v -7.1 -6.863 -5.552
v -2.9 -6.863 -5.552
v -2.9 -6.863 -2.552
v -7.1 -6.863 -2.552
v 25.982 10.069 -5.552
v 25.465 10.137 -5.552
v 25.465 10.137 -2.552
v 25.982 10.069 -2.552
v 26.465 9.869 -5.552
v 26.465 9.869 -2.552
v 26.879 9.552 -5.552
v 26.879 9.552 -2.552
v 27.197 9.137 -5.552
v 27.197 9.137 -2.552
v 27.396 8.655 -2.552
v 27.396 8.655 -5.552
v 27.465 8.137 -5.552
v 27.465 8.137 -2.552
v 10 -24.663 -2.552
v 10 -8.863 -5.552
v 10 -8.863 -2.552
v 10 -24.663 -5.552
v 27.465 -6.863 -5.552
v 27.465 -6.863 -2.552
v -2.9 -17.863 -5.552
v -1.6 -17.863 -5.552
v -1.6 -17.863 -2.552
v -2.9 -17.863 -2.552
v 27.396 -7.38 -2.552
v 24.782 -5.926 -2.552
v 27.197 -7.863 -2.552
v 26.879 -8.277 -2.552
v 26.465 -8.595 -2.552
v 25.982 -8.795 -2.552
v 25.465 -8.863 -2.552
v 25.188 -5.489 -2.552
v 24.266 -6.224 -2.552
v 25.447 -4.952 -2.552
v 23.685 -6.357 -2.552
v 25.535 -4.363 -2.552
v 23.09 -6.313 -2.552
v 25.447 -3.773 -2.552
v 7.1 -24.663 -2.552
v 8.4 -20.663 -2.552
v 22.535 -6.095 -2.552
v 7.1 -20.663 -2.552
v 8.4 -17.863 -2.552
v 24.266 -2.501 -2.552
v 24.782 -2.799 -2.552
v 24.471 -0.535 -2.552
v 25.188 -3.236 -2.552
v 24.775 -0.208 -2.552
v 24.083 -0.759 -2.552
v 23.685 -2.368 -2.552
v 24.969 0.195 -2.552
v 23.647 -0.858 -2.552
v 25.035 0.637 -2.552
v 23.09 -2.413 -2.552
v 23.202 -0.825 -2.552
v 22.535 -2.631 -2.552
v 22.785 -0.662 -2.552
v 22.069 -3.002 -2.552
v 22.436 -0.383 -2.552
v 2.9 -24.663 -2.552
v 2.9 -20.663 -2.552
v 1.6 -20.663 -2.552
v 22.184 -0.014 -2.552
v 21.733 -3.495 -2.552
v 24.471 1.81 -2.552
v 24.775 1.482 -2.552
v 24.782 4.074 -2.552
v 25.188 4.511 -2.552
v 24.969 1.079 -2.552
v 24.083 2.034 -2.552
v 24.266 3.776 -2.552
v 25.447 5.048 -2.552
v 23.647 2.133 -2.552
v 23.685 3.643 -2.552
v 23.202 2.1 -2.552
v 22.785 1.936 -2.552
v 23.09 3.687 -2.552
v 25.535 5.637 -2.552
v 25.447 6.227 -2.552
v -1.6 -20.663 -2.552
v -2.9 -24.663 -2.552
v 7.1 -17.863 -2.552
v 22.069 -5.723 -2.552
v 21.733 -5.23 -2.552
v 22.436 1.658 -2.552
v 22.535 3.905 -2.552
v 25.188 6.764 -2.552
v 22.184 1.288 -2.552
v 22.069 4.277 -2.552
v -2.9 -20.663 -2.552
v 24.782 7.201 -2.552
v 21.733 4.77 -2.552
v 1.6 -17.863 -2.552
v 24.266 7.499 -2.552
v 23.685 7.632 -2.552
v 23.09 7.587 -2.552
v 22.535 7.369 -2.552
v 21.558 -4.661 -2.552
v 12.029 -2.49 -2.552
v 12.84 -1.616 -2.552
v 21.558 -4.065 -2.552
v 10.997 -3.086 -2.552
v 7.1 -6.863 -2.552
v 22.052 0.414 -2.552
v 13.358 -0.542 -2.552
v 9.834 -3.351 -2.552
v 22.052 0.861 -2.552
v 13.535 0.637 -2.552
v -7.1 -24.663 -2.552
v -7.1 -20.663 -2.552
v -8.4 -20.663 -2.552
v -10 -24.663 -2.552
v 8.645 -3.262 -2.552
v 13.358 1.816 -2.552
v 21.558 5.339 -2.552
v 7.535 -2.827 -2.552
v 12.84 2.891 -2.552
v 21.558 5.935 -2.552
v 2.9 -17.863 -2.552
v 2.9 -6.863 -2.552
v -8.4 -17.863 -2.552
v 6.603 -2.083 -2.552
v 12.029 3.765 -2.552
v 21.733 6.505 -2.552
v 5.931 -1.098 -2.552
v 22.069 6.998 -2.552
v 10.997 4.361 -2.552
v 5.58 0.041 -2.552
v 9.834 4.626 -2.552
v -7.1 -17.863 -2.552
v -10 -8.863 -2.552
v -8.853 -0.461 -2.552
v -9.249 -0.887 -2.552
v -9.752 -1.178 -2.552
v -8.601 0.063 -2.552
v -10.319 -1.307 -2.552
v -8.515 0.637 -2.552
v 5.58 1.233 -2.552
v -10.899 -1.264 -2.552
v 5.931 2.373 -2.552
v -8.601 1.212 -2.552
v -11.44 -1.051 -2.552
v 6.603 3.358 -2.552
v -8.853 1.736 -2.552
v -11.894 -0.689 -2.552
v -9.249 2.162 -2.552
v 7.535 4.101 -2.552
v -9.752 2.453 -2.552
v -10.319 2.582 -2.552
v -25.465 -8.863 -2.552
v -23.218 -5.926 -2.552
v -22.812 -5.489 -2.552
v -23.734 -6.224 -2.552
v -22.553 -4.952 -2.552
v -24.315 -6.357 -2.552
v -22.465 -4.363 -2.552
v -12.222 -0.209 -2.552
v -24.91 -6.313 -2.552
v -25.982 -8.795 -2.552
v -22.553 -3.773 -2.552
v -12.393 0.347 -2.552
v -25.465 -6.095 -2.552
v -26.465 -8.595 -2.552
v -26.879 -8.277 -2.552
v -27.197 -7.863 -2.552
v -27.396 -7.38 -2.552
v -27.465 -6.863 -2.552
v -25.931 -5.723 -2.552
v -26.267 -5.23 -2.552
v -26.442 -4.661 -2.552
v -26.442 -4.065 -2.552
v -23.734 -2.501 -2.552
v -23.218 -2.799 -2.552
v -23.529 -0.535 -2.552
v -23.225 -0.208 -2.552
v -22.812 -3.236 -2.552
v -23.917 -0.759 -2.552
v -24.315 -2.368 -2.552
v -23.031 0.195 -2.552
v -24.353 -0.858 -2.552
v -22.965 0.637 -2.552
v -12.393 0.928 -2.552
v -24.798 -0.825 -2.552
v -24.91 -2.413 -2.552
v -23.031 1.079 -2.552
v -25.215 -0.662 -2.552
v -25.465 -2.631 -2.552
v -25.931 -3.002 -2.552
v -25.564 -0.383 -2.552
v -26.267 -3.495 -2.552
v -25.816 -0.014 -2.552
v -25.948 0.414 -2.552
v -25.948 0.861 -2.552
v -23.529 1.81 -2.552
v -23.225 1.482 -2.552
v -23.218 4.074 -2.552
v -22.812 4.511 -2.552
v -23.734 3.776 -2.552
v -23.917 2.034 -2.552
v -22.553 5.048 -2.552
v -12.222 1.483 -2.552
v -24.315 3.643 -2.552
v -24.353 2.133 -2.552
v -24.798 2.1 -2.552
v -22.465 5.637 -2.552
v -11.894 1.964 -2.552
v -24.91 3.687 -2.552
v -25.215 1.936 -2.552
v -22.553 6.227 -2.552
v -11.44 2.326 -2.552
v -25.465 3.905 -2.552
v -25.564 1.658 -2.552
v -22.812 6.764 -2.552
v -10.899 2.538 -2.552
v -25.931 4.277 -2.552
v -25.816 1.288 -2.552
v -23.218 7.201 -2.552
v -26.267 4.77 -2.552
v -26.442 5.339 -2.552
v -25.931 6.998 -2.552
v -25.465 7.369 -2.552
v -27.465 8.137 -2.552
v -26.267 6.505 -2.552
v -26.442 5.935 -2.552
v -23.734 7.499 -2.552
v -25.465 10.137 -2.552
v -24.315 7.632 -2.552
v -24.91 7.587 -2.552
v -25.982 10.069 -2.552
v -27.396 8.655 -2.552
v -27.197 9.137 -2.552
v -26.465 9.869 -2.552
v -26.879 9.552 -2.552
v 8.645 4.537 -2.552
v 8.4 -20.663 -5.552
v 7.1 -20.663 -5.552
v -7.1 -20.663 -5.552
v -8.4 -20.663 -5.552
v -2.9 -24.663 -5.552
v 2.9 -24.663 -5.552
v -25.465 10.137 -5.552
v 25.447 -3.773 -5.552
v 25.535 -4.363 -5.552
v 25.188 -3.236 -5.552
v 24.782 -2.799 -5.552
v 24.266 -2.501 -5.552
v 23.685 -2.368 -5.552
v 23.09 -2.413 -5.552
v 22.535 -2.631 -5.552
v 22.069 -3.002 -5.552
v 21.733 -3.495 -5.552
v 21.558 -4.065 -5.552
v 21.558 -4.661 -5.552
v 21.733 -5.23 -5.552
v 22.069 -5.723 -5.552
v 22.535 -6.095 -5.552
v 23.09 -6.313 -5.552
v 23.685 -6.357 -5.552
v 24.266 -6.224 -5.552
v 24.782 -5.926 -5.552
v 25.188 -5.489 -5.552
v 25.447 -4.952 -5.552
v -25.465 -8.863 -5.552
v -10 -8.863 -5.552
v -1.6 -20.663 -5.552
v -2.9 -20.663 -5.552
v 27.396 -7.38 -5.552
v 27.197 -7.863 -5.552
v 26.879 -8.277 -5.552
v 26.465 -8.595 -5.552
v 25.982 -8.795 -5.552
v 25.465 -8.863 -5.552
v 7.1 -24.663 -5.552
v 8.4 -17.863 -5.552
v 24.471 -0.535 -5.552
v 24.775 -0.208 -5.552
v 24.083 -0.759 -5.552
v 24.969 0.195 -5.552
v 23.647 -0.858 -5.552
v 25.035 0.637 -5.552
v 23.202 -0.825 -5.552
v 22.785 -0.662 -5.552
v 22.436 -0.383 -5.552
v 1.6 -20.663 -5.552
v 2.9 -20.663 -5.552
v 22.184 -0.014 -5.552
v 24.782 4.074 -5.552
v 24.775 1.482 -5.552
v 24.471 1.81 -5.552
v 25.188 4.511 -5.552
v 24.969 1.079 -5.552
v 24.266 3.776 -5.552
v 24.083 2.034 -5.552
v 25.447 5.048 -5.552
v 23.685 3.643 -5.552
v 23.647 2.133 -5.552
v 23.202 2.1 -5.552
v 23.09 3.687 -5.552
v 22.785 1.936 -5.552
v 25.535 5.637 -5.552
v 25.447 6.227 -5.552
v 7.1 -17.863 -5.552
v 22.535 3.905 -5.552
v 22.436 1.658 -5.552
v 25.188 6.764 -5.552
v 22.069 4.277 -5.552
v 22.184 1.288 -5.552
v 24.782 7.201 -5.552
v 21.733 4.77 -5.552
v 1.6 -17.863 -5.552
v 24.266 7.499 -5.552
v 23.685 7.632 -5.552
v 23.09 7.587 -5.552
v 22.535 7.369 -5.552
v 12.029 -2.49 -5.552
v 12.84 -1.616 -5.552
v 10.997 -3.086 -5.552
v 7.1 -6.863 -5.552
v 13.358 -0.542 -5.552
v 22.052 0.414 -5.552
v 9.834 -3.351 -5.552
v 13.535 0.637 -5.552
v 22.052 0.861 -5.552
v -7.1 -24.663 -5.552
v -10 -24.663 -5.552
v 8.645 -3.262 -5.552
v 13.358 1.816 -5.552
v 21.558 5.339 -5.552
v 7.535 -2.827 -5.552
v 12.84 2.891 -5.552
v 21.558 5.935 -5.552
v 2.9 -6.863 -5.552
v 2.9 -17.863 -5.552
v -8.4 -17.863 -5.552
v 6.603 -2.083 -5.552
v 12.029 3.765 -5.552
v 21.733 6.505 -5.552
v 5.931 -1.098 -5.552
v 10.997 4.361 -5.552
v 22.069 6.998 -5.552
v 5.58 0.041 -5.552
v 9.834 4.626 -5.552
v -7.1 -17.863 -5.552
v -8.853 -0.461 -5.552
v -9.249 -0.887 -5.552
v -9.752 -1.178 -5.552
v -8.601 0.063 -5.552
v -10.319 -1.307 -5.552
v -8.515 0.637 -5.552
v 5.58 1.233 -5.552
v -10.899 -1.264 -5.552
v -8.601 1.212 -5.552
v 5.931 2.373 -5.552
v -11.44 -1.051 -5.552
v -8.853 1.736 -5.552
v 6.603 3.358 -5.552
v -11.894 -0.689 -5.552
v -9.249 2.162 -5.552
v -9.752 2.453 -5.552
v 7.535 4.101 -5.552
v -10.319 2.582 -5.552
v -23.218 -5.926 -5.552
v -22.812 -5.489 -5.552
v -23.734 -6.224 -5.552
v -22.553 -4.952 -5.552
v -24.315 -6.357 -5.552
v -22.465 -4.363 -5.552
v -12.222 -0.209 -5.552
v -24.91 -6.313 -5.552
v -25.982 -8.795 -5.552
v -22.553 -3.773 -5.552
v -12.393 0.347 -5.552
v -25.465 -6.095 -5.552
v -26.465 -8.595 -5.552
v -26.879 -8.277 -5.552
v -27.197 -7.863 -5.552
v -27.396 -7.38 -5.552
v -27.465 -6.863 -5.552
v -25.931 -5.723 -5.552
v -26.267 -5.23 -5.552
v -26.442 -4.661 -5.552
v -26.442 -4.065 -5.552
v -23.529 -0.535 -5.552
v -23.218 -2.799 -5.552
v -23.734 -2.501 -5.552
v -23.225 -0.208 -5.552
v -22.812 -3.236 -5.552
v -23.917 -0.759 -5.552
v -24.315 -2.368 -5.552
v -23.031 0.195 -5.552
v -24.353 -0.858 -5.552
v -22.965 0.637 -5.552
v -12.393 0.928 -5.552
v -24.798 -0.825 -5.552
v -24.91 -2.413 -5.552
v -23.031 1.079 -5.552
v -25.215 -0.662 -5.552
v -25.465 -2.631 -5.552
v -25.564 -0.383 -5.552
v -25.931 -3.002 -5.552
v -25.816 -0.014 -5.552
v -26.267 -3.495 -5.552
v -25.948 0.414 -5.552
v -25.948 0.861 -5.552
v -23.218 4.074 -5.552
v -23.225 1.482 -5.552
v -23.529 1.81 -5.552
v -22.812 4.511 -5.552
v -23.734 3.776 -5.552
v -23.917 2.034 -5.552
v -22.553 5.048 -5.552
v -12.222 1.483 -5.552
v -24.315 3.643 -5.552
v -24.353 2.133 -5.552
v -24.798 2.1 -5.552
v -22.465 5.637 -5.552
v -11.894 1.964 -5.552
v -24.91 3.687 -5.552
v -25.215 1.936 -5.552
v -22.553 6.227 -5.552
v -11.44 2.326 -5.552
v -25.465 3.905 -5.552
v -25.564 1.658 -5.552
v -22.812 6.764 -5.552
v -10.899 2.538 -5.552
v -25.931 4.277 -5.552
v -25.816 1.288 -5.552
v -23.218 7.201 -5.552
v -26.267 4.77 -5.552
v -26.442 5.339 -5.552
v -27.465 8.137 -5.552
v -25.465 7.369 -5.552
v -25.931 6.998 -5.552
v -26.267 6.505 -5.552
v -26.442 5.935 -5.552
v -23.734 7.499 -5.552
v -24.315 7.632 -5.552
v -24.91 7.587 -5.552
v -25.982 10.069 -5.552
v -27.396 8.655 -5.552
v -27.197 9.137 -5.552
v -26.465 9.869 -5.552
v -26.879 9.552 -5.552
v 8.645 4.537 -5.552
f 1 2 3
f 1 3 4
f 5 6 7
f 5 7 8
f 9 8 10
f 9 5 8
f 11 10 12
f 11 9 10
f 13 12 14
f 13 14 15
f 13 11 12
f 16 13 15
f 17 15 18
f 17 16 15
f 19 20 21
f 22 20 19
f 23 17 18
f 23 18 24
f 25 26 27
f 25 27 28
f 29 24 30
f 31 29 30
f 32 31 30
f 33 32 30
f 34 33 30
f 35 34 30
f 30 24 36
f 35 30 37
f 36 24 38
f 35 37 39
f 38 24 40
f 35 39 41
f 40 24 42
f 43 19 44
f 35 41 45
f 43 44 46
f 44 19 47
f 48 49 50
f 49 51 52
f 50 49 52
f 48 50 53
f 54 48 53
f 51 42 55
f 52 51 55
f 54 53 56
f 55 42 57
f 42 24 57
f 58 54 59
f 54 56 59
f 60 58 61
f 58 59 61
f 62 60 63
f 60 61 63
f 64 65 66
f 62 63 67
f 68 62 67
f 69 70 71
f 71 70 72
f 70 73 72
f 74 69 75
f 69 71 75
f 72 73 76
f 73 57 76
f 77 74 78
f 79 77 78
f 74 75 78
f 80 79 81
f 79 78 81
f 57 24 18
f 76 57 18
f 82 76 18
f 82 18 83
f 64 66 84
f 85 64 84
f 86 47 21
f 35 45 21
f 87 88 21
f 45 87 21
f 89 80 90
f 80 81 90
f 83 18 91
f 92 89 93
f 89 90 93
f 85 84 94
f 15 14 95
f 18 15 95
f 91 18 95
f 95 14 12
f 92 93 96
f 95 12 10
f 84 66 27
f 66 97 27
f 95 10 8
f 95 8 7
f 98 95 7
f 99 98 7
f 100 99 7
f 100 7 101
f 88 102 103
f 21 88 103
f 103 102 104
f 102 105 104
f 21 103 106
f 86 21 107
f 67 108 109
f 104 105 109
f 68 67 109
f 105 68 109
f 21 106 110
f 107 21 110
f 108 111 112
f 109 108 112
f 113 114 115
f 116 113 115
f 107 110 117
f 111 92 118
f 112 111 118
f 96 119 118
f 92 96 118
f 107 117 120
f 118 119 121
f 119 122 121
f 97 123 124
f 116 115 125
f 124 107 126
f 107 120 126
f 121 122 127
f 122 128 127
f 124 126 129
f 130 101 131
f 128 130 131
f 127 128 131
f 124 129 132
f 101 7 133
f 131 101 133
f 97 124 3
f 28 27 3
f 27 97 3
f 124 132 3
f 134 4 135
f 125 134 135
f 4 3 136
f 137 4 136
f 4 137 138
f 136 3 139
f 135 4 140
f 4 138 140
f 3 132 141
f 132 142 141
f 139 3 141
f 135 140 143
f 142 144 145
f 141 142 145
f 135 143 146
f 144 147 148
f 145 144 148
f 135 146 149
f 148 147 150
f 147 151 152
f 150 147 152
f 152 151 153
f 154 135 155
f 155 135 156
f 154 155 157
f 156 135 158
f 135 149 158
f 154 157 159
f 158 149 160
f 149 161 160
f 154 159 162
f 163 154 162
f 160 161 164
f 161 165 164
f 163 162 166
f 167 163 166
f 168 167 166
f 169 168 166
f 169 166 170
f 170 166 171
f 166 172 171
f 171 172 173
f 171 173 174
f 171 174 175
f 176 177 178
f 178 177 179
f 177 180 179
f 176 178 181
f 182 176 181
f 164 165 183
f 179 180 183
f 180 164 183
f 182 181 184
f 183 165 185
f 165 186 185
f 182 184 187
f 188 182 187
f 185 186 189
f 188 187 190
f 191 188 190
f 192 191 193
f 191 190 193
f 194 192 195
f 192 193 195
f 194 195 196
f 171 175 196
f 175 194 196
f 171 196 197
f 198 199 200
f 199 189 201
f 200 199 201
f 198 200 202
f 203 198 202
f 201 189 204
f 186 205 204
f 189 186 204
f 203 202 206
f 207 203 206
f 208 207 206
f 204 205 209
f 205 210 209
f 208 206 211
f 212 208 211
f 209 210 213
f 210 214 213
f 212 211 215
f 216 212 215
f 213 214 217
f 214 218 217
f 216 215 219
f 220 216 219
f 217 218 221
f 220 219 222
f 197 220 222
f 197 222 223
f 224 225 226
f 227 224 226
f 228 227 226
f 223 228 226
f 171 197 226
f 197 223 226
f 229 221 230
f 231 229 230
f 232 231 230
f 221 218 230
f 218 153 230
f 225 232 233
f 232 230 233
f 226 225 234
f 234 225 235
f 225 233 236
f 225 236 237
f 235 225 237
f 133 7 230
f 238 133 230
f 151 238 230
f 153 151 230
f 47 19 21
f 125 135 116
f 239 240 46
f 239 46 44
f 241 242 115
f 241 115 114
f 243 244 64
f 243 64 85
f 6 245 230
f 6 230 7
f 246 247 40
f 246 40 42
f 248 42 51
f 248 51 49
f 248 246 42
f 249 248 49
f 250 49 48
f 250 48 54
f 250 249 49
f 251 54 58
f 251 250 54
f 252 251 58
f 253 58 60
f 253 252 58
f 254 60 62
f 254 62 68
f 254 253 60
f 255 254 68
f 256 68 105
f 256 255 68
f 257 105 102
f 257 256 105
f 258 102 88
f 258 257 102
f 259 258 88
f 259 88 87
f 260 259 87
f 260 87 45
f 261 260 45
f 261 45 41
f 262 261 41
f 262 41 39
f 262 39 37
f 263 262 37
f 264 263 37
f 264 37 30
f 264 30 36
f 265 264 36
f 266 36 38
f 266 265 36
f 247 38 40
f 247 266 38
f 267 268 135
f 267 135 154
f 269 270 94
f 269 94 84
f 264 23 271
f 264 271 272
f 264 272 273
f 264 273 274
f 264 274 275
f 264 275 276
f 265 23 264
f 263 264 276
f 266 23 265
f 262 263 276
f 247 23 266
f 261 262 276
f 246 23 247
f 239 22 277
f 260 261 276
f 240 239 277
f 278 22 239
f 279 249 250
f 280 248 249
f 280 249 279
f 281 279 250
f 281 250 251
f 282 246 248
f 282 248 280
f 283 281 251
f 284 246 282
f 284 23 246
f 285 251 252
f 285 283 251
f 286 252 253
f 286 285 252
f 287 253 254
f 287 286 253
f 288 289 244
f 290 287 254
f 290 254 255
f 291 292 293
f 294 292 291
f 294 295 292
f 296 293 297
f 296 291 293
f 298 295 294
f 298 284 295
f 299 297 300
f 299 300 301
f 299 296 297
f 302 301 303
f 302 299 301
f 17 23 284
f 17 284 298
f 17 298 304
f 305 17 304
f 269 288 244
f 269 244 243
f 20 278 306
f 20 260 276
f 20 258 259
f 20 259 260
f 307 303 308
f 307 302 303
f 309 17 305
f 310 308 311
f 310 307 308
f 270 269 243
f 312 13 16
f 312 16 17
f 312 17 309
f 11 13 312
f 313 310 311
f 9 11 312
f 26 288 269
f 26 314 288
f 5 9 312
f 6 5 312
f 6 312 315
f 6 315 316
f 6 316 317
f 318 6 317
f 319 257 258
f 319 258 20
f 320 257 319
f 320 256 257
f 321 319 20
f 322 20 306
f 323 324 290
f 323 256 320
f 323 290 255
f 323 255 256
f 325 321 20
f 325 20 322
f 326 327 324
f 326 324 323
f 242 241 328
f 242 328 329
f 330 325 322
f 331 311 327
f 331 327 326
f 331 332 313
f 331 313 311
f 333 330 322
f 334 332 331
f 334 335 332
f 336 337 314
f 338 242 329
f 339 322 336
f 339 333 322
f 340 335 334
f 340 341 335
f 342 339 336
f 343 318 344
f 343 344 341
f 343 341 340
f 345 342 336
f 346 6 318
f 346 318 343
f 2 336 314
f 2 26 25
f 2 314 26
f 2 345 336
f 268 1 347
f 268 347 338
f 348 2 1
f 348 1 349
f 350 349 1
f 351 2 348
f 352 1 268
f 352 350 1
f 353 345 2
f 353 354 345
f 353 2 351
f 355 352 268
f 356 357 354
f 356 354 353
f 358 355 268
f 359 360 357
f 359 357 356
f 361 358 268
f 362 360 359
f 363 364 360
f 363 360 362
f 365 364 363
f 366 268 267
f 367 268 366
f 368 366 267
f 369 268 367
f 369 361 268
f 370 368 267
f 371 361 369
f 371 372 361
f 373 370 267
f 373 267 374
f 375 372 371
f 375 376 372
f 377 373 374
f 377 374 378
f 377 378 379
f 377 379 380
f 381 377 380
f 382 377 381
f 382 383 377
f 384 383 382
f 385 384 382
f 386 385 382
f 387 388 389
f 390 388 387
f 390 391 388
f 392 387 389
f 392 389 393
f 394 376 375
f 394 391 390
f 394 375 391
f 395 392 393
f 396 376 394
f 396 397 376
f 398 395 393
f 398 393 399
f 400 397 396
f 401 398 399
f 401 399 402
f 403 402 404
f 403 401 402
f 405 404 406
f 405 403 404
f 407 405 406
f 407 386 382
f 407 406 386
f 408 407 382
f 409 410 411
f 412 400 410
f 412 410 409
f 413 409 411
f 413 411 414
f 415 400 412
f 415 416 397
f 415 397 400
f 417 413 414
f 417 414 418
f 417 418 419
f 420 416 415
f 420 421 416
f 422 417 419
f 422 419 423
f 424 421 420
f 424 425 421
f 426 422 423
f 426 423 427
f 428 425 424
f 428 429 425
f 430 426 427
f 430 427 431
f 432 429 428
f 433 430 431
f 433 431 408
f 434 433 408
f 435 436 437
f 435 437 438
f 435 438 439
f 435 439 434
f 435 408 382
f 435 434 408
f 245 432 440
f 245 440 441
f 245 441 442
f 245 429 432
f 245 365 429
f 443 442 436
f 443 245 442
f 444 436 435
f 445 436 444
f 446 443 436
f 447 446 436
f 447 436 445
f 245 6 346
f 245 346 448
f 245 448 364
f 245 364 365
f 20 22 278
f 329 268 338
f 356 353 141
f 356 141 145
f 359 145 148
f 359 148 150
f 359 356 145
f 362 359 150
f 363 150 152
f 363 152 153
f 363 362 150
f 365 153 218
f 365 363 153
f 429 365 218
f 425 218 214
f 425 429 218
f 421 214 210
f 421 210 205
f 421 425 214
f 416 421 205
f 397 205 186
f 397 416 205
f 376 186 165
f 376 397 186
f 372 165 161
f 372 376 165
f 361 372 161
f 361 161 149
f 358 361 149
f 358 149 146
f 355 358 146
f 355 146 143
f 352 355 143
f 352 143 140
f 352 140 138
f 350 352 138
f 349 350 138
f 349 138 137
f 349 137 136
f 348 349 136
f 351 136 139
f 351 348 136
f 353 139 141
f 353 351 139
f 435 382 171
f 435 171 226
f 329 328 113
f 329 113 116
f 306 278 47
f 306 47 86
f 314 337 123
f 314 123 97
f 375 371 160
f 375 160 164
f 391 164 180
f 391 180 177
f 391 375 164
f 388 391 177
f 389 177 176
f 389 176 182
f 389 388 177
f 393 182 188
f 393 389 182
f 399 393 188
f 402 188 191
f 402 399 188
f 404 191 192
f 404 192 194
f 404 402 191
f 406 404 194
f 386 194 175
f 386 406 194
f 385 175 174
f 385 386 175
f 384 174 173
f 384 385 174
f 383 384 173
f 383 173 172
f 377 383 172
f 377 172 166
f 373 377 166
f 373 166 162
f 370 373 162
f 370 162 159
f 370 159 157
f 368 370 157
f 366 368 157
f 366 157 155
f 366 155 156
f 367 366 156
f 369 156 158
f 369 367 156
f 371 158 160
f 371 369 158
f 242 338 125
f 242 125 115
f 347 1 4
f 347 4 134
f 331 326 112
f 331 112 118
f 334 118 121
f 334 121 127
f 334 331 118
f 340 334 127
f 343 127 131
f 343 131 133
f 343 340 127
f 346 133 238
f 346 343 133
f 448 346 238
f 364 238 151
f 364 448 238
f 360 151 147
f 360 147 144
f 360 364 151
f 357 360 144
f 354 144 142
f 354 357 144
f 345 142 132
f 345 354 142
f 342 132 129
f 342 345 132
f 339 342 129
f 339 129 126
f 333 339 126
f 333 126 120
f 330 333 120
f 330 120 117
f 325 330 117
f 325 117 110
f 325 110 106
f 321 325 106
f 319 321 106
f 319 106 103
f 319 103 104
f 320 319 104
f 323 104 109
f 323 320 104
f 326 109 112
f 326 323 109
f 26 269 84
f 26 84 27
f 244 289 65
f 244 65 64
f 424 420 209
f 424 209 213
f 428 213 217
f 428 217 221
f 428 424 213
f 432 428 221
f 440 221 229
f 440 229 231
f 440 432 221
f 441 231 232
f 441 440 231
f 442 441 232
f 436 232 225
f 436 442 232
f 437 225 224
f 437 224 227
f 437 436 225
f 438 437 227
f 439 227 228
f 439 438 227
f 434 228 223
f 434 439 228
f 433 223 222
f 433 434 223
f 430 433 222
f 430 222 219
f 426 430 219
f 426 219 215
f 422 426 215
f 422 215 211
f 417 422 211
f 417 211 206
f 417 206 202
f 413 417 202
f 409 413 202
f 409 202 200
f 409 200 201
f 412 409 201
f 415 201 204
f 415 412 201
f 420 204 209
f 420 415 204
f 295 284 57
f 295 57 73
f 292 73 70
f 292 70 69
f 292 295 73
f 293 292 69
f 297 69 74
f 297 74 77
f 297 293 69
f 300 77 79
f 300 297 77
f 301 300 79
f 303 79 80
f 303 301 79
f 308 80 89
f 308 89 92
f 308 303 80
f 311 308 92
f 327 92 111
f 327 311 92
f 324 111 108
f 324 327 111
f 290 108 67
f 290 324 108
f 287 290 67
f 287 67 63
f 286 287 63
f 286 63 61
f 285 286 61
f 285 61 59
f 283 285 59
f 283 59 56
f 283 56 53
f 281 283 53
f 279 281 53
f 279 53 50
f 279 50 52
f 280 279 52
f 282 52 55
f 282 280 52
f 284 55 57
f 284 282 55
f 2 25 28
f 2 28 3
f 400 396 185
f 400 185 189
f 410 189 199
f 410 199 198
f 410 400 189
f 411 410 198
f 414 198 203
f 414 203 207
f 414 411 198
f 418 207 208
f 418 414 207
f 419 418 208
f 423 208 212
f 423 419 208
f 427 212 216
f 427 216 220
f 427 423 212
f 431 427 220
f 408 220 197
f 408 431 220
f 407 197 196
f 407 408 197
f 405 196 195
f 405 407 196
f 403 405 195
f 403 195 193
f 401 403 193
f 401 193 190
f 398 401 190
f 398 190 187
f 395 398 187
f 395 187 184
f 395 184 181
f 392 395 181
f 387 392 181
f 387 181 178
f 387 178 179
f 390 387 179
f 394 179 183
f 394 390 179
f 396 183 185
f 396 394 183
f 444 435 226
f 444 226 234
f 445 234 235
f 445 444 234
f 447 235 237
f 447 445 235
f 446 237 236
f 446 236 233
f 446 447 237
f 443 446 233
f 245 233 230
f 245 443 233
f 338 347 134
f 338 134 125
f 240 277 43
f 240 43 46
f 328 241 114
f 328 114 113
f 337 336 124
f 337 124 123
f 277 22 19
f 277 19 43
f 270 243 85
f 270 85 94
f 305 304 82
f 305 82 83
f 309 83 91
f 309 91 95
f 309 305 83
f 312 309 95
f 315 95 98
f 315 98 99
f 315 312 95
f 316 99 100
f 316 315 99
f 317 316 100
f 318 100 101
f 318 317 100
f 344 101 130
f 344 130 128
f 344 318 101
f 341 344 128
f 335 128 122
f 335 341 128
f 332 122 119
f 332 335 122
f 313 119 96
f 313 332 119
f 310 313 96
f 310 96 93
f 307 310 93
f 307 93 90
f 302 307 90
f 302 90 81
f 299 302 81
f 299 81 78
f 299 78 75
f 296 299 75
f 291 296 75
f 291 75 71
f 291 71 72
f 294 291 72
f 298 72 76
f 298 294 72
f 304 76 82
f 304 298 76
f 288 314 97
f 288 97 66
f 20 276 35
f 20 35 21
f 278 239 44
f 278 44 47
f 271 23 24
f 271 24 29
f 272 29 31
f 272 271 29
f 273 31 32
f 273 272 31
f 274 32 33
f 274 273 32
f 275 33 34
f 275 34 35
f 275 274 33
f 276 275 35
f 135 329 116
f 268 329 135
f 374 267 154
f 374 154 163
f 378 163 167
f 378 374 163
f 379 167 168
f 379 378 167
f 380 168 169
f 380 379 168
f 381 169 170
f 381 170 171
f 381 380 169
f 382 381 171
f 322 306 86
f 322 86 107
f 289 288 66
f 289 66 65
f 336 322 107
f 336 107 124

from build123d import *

# Parameters (mm, degrees)
SKETCH1_R           = 2
SKETCH1_R_2         = 4
SKETCH1_R_3         = 1.95
SKETCH1_R_4         = 1.5
BOSS_EXTRUDE1_DEPTH = 3


with BuildPart() as part:
    # Sketch1 → Boss-Extrude1 (new body)
    with BuildSketch(Plane.XY.offset(-5.551615438)):
        with BuildLine():
            Line((-25.464626351, 10.13731735), (25.464626351, 10.13731735))
            ThreePointArc((25.464626351, 10.13731735), (26.878839913, 9.551530913), (27.464626351, 8.13731735))
            Line((27.464626351, 8.13731735), (27.464626351, -6.86268265))
            ThreePointArc((27.464626351, -6.86268265), (26.878839913, -8.276896212), (25.464626351, -8.86268265))
            Line((25.464626351, -8.86268265), (10, -8.86268265))
            Line((10, -8.86268265), (10, -24.66268265))
            Line((10, -24.66268265), (7.1, -24.66268265))
            Line((7.1, -24.66268265), (7.1, -20.66268265))
            Line((7.1, -20.66268265), (8.4, -20.66268265))
            Line((8.4, -20.66268265), (8.4, -17.86268265))
            Line((8.4, -17.86268265), (7.1, -17.86268265))
            Line((7.1, -17.86268265), (7.1, -6.86268265))
            Line((7.1, -6.86268265), (2.9, -6.86268265))
            Line((2.9, -6.86268265), (2.9, -17.86268265))
            Line((2.9, -17.86268265), (1.6, -17.86268265))
            Line((1.6, -17.86268265), (1.6, -20.66268265))
            Line((1.6, -20.66268265), (2.9, -20.66268265))
            Line((2.9, -20.66268265), (2.9, -24.66268265))
            Line((2.9, -24.66268265), (0, -24.66268265))
            Line((0, -24.66268265), (-2.9, -24.66268265))
            Line((-2.9, -24.66268265), (-2.9, -20.66268265))
            Line((-2.9, -20.66268265), (-1.6, -20.66268265))
            Line((-1.6, -20.66268265), (-1.6, -17.86268265))
            Line((-1.6, -17.86268265), (-2.9, -17.86268265))
            Line((-2.9, -17.86268265), (-2.9, -6.86268265))
            Line((-2.9, -6.86268265), (-7.1, -6.86268265))
            Line((-7.1, -6.86268265), (-7.1, -17.86268265))
            Line((-7.1, -17.86268265), (-8.4, -17.86268265))
            Line((-8.4, -17.86268265), (-8.4, -20.66268265))
            Line((-8.4, -20.66268265), (-7.1, -20.66268265))
            Line((-7.1, -20.66268265), (-7.1, -24.66268265))
            Line((-7.1, -24.66268265), (-10, -24.66268265))
            Line((-10, -24.66268265), (-10, -8.86268265))
            Line((-10, -8.86268265), (-25.464626351, -8.86268265))
            ThreePointArc((-25.464626351, -8.86268265), (-26.878839913, -8.276896212), (-27.464626351, -6.86268265))
            Line((-27.464626351, -6.86268265), (-27.464626351, 8.13731735))
            ThreePointArc((-27.464626351, 8.13731735), (-26.878839913, 9.551530913), (-25.464626351, 10.13731735))
        make_face()
        with Locations((-24.464626351, 5.63731735)):
            Circle(SKETCH1_R, mode=Mode.SUBTRACT)
        with Locations((-24.464626351, -4.36268265)):
            Circle(SKETCH1_R, mode=Mode.SUBTRACT)
        with Locations((23.535373649, -4.36268265)):
            Circle(SKETCH1_R, mode=Mode.SUBTRACT)
        with Locations((23.535373649, 5.63731735)):
            Circle(SKETCH1_R, mode=Mode.SUBTRACT)
        with Locations((9.535373649, 0.63731735)):
            Circle(SKETCH1_R_2, mode=Mode.SUBTRACT)
        with Locations((-10.464626351, 0.63731735)):
            Circle(SKETCH1_R_3, mode=Mode.SUBTRACT)
        with Locations((-24.464626351, 0.63731735)):
            Circle(SKETCH1_R_4, mode=Mode.SUBTRACT)
        with Locations((23.535373649, 0.63731735)):
            Circle(SKETCH1_R_4, mode=Mode.SUBTRACT)
    extrude(amount=BOSS_EXTRUDE1_DEPTH)


solid = part.part
